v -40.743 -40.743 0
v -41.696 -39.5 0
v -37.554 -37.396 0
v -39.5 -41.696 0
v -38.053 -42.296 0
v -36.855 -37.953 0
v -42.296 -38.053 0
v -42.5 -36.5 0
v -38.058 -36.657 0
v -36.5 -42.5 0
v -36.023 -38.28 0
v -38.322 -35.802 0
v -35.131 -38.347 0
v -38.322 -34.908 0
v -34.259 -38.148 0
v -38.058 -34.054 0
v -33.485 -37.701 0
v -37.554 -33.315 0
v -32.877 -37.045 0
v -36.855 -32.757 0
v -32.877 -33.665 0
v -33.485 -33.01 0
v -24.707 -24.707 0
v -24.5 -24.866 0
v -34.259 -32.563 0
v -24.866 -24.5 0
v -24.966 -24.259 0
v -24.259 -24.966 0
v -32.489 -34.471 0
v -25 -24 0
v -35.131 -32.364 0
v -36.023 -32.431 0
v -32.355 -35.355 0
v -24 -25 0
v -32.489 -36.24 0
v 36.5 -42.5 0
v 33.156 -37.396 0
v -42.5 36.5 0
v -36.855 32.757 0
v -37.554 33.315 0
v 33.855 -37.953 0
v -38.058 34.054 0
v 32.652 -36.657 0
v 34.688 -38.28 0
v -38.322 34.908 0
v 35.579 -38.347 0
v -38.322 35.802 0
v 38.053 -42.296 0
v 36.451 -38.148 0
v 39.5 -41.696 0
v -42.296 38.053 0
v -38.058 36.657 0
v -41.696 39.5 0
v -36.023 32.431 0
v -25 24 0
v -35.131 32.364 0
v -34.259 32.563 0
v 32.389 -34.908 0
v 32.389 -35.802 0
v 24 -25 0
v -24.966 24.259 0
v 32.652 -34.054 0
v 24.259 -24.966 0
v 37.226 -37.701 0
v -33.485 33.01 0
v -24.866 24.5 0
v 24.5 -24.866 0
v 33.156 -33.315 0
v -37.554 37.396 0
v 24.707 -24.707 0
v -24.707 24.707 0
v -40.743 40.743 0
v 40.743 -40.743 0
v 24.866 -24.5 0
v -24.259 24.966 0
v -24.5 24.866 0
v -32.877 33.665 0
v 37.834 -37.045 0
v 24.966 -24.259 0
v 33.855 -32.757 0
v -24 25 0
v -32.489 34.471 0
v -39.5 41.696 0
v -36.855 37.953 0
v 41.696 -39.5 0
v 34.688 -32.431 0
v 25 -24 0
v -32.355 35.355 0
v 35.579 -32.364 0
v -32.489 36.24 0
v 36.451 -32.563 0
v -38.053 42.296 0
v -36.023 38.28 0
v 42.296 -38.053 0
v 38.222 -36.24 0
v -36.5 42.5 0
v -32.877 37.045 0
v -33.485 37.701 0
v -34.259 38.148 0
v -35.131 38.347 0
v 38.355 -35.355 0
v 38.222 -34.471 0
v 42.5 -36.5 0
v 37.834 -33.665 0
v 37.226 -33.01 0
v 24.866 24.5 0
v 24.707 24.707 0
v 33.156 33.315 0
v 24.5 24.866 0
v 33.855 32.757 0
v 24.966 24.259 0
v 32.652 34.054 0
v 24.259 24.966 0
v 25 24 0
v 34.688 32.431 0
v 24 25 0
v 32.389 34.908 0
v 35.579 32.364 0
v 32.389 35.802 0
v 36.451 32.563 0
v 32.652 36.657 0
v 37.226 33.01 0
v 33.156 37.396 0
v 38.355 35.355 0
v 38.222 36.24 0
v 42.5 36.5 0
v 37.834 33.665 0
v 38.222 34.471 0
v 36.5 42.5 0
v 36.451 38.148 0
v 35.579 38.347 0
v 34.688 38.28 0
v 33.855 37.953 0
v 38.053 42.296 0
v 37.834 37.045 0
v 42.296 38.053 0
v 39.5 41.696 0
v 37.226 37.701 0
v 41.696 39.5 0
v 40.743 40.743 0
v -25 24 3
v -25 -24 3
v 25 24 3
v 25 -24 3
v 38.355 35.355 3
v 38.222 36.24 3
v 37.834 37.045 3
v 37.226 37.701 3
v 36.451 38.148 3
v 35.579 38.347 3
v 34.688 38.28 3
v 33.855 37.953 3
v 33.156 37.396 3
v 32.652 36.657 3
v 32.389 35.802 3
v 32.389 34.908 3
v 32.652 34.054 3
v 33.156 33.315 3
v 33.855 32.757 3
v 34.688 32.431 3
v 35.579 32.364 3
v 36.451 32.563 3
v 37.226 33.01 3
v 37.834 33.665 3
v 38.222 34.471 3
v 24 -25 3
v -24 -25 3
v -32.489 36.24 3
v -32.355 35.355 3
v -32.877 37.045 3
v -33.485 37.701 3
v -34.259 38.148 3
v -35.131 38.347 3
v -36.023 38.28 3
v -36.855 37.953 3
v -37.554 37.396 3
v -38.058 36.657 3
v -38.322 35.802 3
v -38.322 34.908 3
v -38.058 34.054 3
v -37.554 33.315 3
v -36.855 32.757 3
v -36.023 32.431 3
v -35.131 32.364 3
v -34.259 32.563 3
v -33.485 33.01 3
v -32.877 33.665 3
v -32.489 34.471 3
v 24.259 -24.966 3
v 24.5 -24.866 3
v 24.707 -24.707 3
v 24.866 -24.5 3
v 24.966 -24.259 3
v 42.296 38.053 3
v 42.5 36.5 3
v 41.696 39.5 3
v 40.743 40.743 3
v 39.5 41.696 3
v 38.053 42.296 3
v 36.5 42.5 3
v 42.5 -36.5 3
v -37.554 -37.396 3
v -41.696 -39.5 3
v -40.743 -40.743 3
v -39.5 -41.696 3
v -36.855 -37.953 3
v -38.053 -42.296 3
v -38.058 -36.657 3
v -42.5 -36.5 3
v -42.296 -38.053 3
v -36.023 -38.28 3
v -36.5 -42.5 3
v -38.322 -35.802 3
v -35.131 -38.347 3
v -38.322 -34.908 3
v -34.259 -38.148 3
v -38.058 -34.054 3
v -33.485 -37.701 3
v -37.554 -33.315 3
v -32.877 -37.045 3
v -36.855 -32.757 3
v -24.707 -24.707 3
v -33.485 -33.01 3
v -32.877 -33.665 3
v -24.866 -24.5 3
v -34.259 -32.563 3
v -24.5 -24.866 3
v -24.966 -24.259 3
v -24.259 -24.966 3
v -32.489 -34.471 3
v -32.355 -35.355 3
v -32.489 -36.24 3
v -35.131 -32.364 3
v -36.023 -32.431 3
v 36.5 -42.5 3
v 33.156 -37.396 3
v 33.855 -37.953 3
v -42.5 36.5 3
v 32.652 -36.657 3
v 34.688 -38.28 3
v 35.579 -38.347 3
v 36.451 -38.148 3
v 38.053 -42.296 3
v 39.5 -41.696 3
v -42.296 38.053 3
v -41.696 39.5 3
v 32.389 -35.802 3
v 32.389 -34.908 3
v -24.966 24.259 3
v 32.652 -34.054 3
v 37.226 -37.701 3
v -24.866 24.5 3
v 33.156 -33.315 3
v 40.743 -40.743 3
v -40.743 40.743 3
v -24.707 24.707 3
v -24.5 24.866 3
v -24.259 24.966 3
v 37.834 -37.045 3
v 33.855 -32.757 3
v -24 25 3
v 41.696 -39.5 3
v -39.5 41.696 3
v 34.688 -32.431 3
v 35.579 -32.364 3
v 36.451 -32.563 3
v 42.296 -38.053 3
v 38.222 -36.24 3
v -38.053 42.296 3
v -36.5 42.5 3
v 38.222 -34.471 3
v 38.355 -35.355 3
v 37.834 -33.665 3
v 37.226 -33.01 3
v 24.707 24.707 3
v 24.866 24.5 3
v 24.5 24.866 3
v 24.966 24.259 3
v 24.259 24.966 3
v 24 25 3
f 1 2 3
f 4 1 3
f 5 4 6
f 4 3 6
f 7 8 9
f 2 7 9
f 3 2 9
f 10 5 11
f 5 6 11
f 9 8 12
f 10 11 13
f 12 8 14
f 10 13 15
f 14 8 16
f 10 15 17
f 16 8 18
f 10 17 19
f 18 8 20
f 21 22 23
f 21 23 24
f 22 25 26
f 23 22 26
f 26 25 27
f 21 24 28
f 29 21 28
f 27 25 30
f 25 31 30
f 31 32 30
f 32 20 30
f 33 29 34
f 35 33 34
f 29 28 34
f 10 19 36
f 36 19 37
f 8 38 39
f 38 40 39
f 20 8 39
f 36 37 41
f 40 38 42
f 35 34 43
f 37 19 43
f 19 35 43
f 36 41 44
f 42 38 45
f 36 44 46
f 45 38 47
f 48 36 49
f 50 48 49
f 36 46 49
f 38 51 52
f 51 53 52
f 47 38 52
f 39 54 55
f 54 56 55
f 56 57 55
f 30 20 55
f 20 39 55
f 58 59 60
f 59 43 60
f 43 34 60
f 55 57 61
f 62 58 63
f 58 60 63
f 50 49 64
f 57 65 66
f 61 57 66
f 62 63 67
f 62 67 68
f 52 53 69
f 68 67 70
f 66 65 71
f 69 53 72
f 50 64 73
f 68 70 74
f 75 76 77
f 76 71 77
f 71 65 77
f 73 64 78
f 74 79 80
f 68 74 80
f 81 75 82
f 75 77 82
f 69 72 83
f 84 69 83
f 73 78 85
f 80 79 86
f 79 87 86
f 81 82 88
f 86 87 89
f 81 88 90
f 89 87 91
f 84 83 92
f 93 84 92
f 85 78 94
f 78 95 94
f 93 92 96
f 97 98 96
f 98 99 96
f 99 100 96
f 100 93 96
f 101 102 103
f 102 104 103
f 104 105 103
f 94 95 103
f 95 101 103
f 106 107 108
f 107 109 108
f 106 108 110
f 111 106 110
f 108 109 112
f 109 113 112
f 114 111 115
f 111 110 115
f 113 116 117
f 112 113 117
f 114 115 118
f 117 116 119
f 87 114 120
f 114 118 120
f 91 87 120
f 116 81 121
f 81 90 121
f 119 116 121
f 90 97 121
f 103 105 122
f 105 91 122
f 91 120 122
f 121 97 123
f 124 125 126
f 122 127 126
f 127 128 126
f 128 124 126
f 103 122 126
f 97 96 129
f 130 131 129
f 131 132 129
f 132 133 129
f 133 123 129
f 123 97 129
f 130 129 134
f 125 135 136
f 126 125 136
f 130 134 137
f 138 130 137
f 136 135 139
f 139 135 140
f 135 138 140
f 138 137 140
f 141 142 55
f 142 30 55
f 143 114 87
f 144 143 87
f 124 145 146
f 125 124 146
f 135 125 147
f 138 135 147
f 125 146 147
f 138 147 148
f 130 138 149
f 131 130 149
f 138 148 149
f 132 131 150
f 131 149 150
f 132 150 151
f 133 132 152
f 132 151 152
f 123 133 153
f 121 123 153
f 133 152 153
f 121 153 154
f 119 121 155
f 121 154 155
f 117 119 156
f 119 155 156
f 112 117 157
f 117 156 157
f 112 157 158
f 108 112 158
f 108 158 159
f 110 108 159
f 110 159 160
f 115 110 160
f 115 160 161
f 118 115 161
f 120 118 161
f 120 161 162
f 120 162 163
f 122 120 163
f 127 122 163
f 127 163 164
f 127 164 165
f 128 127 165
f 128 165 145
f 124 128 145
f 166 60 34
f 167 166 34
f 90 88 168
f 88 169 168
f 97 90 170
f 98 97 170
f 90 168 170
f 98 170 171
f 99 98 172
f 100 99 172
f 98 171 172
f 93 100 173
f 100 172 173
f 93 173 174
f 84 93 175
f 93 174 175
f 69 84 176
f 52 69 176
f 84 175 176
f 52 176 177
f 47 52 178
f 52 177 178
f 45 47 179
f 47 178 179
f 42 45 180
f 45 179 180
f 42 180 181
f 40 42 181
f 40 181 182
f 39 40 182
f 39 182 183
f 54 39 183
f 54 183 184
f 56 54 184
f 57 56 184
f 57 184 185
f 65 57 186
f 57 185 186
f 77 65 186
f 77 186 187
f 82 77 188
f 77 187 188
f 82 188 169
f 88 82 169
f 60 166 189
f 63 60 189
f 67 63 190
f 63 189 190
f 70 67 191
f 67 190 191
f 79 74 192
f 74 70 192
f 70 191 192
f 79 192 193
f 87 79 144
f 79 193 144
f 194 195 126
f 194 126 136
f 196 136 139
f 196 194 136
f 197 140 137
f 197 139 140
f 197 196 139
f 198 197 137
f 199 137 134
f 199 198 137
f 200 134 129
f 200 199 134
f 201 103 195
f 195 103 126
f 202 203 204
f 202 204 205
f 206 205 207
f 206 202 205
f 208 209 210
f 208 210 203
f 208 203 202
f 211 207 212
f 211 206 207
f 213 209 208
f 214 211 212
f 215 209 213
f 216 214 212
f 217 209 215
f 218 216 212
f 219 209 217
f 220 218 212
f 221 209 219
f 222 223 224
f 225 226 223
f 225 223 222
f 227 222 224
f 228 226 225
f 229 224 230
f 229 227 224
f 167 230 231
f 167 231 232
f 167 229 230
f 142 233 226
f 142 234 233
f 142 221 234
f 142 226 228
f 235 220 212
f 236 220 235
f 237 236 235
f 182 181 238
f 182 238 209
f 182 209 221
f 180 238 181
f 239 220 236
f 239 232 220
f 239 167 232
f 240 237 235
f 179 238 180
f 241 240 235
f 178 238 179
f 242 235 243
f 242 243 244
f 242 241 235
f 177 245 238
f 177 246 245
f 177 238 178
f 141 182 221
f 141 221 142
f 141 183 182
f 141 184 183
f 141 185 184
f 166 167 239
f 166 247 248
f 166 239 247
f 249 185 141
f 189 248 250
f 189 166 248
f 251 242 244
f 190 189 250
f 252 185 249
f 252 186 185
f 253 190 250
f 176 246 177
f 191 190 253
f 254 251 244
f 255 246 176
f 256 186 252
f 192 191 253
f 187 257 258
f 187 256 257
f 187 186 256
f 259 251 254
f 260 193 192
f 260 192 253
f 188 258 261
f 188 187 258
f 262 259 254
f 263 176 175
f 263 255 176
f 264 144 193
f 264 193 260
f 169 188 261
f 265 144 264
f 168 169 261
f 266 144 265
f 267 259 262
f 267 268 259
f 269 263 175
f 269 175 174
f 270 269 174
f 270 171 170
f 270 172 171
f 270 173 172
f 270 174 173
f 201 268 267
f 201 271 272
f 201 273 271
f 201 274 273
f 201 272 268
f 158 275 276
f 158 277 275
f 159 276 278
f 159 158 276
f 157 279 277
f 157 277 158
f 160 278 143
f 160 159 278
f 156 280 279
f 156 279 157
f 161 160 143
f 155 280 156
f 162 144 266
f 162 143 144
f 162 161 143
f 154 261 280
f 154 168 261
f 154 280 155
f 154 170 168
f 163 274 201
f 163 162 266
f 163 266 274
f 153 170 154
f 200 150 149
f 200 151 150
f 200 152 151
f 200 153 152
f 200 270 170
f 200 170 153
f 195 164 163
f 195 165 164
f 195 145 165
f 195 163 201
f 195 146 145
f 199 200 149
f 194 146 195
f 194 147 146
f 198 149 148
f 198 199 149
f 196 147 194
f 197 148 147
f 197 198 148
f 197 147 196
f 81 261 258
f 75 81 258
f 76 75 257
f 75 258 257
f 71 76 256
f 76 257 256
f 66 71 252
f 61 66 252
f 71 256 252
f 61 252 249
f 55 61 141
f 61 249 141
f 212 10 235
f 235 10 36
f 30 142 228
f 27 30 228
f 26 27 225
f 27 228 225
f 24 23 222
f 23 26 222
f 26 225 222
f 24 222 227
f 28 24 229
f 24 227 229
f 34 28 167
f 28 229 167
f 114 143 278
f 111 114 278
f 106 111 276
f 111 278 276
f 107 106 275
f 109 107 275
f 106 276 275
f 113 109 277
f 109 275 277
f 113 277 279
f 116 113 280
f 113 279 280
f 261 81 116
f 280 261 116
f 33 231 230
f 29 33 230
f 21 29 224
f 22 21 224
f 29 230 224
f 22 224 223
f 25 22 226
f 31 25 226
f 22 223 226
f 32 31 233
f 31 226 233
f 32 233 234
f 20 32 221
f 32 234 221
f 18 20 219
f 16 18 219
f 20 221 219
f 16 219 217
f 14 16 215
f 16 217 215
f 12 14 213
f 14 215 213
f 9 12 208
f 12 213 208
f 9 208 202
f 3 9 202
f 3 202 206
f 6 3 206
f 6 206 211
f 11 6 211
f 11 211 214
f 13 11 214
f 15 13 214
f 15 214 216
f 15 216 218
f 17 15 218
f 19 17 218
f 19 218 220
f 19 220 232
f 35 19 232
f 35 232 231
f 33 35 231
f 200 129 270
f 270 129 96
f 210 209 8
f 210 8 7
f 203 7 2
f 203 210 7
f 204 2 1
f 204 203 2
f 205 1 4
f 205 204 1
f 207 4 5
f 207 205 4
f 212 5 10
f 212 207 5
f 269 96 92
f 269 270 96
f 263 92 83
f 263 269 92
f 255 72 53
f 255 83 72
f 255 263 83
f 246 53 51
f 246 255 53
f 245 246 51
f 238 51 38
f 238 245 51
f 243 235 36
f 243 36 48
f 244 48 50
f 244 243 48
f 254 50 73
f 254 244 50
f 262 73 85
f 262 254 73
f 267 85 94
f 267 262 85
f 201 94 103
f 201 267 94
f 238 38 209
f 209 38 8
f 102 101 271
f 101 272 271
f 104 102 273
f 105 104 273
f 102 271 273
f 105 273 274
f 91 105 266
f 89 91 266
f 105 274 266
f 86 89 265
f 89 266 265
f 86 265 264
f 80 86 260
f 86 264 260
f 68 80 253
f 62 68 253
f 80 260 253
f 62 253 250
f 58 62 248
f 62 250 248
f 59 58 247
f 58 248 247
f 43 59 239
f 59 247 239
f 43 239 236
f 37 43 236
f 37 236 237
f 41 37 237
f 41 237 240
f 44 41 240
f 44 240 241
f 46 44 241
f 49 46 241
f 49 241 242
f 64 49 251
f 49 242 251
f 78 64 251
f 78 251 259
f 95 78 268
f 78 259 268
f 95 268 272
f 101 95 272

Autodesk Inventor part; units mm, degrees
ref_plane "YZ Plane" through (0, 0, 0) normal (1, 0, 0) x (0, 1, 0)
ref_plane "XZ Plane" through (0, 0, 0) normal (0, 1, 0) x (-1, 0, 0)
ref_plane "XY Plane" through (0, 0, 0) normal (0, 0, 1) x (1, 0, 0)
sketch "Sketch1" plane through (0, 0, 0) normal (0, 0, 1) x (1, 0, 0)
  line L0 (-42.5, -42.5) -> (42.5, -42.5)
  line L1 (42.5, -42.5) -> (42.5, 42.5)
  line L2 (42.5, 42.5) -> (-42.5, 42.5)
  line L3 (-42.5, 42.5) -> (-42.5, -42.5)
  line L4 (-42.5, -42.5) -> (42.5, 42.5) construction
  line L5 (42.5, -42.5) -> (-42.5, 42.5) construction
  line L6 (25, -25) -> (-25, -25)
  line L7 (-25, -25) -> (-25, 25)
  line L8 (-25, 25) -> (25, 25)
  line L9 (25, 25) -> (25, -25)
  line L10 (25, -25) -> (-25, 25) construction
  line L11 (-25, -25) -> (25, 25) construction
  point P0 (0, 0)
  dimension "d154" = 85
  dimension "d155" = 85
  dimension "d172" = 50
extrude "Plate5" add sketch "Sketch1" along normal blind 3
sketch "Sketch9" plane through (0, 0, 3) normal (0, 0, 1) x (1, 0, 0)
  circle A0 centre (35.3553, -35.3553) radius 3
  line L0 (35.3553, 35.3553) -> (-35.3553, 35.3553) construction
  line L1 (-35.3553, 35.3553) -> (-35.3553, -35.3553) construction
  line L2 (-35.3553, -35.3553) -> (35.3553, -35.3553) construction
  line L3 (35.3553, -35.3553) -> (35.3553, 35.3553) construction
  line L4 (35.3553, 35.3553) -> (-35.3553, -35.3553) construction
  line L5 (-35.3553, 35.3553) -> (35.3553, -35.3553) construction
  circle A1 centre (-35.3553, -35.3553) radius 3
  circle A2 centre (35.3553, 35.3553) radius 3
  circle A3 centre (-35.3553, 35.3553) radius 3
  circle A4 centre (0, 0) radius 50 construction
  dimension "d180" = 100
  dimension "d174" = 6
extrude "Cut2" cut sketch "Sketch9" against normal blind 3
fillet "Corner Round1" radius 6 4 edges at (42.5, 42.5, 1.5) (-42.5, 42.5, 1.5) (-42.5, -42.5, 1.5) (42.5, -42.5, 1.5)
fillet "Corner Round2" radius 1 4 edges at (-25, 25, 1.5) (-25, -25, 1.5) (25, -25, 1.5) (25, 25, 1.5)
properties part number "TKS 3531 FDS Way FLANGE" material "Stainless Steel"
